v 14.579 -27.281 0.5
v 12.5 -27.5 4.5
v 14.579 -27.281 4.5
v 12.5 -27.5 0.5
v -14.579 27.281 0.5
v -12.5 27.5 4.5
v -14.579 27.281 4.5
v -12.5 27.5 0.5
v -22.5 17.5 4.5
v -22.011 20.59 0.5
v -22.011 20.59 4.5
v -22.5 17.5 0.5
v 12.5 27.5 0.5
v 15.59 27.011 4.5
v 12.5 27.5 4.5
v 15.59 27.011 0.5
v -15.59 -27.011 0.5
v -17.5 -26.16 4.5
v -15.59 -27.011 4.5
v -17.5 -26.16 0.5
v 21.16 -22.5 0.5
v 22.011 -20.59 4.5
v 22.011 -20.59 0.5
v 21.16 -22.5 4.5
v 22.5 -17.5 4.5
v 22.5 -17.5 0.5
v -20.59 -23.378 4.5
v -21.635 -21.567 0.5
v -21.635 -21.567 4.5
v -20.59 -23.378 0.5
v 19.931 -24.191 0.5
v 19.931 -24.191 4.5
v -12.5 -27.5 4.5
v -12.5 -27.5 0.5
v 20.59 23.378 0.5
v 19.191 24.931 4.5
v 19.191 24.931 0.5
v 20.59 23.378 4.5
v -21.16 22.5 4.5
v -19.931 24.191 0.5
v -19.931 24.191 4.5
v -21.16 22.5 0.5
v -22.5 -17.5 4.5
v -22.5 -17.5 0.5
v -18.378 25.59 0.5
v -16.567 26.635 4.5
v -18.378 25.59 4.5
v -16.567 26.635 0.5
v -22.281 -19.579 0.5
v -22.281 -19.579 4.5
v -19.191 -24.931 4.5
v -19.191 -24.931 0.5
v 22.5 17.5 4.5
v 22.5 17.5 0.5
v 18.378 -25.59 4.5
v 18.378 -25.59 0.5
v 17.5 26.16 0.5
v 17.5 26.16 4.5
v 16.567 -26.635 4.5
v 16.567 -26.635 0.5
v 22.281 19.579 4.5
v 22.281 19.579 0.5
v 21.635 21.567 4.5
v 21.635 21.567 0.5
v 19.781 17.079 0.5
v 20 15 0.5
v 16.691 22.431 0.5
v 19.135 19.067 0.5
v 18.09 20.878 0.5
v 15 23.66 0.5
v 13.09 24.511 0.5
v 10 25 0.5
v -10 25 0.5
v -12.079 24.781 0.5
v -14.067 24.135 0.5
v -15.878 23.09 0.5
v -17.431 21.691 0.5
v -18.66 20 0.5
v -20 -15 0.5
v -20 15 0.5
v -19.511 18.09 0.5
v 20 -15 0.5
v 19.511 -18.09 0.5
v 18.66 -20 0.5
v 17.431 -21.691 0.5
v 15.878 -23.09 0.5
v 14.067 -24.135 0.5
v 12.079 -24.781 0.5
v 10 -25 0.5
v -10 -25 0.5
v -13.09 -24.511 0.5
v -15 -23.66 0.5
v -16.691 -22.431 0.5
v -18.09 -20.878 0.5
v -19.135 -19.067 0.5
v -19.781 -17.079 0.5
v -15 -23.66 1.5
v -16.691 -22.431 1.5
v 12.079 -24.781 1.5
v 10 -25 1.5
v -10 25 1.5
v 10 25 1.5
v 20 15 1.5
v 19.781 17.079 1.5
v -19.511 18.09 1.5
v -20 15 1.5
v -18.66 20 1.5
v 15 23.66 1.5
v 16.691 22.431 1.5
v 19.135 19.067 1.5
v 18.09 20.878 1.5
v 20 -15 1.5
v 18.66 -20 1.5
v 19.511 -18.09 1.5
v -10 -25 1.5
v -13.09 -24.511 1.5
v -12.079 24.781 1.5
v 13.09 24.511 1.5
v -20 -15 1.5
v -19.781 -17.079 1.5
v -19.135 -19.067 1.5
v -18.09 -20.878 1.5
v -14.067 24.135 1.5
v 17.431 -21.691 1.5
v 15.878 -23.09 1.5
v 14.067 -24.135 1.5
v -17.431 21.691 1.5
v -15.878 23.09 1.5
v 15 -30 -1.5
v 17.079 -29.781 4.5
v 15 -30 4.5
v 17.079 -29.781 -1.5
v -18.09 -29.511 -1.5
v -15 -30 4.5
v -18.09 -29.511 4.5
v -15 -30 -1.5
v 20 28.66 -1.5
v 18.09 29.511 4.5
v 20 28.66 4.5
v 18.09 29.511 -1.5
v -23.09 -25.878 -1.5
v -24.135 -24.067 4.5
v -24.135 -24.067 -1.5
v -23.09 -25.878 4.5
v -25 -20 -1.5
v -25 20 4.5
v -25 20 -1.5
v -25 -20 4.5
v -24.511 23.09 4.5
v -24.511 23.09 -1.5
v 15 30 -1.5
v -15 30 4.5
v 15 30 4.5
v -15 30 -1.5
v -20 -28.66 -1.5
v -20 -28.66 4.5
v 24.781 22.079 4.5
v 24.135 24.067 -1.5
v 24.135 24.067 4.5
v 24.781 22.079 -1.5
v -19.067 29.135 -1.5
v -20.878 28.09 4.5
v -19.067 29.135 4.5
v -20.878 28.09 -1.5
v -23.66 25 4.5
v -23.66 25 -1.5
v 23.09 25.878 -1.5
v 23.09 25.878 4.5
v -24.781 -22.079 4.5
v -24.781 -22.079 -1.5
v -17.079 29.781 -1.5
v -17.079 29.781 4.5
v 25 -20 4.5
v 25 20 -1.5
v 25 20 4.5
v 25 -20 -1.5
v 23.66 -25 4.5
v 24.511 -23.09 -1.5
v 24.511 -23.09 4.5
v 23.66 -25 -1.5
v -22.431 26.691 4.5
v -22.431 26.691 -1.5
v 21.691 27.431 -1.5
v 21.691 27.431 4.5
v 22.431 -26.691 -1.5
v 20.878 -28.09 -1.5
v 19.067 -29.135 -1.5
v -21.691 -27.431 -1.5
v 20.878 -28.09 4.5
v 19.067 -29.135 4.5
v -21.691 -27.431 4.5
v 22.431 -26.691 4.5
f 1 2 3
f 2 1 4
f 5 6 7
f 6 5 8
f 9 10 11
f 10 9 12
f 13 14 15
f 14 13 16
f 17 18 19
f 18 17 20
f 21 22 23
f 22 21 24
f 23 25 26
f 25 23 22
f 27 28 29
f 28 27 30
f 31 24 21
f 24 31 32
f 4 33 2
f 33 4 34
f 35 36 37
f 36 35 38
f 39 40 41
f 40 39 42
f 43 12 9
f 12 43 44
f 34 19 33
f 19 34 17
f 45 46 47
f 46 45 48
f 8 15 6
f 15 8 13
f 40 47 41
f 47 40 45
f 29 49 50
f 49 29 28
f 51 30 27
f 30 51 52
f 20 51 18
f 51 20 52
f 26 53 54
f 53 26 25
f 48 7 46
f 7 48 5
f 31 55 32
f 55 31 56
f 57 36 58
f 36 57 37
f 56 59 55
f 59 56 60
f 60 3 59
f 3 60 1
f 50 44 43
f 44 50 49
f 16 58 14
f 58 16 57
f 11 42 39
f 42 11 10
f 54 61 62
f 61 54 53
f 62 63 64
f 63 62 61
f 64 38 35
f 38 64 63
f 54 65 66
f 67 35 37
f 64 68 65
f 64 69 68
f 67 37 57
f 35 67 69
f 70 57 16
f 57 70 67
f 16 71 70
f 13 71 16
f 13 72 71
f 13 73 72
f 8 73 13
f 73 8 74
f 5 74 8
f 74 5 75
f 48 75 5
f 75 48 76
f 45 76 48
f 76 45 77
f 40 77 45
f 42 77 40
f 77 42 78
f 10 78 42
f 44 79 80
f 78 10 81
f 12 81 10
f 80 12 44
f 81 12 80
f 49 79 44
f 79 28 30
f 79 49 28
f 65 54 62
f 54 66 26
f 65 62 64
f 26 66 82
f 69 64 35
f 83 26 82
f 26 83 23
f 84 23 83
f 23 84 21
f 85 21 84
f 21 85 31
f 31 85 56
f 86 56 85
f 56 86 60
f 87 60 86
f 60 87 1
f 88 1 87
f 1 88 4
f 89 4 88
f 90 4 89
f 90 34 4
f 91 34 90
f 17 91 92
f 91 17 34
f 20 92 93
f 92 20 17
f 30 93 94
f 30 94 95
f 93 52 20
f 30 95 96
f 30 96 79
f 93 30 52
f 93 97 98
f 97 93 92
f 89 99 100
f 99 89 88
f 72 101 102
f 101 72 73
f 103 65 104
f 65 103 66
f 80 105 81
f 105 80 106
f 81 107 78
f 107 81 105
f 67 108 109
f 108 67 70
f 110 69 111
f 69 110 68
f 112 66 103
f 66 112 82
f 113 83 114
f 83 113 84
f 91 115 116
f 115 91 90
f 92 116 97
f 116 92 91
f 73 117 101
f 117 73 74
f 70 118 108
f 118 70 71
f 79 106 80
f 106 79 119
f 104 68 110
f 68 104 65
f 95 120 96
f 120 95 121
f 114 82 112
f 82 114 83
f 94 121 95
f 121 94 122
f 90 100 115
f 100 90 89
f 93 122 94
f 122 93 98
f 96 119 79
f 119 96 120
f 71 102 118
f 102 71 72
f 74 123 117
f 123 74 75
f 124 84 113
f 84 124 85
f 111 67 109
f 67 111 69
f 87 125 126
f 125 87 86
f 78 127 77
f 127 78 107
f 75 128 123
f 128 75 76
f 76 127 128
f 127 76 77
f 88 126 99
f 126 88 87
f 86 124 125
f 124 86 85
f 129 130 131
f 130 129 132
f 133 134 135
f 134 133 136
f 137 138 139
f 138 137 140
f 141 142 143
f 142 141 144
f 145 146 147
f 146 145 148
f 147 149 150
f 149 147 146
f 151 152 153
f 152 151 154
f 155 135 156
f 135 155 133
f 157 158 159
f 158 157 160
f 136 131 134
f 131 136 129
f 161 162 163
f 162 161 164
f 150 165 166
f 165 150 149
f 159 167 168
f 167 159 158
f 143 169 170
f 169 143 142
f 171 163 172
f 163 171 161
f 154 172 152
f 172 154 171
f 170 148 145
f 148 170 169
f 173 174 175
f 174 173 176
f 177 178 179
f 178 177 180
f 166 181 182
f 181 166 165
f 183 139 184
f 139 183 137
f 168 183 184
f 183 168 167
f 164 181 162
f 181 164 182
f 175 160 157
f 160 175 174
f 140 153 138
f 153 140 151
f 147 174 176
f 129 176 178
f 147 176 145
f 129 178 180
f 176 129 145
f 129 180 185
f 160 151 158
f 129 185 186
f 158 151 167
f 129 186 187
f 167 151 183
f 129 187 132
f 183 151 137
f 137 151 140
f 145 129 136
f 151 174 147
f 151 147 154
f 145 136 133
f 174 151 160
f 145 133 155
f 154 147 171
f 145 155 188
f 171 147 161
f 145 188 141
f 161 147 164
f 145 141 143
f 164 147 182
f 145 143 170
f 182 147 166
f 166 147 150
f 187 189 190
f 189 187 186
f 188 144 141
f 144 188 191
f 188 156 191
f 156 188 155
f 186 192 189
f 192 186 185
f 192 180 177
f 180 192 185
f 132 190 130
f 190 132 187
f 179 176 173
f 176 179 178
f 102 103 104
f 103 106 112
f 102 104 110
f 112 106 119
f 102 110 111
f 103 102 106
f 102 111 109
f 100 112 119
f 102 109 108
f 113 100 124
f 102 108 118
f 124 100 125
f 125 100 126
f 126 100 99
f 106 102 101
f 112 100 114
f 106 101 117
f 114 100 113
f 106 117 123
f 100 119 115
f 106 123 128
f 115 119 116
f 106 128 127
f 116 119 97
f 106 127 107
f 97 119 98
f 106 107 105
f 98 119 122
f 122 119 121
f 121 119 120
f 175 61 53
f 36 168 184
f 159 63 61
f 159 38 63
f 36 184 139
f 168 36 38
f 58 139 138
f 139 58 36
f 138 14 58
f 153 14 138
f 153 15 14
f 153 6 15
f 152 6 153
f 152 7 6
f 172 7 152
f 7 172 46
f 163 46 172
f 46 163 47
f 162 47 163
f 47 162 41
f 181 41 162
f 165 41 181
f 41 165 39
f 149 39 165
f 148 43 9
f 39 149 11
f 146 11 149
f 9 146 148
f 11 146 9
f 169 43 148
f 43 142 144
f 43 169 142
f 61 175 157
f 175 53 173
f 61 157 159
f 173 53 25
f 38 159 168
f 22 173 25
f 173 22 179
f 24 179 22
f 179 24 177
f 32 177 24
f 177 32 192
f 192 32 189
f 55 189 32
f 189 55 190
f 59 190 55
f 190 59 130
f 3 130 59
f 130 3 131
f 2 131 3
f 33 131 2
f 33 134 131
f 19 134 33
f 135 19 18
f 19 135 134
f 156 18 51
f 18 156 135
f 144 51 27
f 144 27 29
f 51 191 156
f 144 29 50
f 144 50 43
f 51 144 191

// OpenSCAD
/*
 * Test for a stamp mold
 */
echo(version=version());

logo = "./images/jared.png"; 
imgRatio = 1.5;
logox = 732 * imgRatio; 
logoy = 524 * imgRatio; 

module roundedRect(size, radius) {  
	linear_extrude(height=size.z, center=true) {
		offset(radius) offset(-radius) {
			square([size.x, size.y], center = true);
		}
	}
}

// Base plate
// ----------
plateWidth = 50;
plateLength = 60;
plateThickNess = 3;
cornerRadius = 10;

difference() {  
	union() {
		difference() {
			roundedRect([plateWidth, plateLength, plateThickNess], cornerRadius);
			translate([0, 0, 2]) {
				scale([.9 * plateWidth / logox, .9 * plateWidth / logoy, .02]) {
					color("white") {
						rotate([0, 0, -90]) {
							surface(file=logo, invert=true, center=true);
						}
					}
				}
        // the groove around the picture
        difference() {
          roundedRect([plateWidth -  5, plateLength -  5, plateThickNess], cornerRadius);
          roundedRect([plateWidth - 10, plateLength - 10, plateThickNess * 1.1], cornerRadius);
        }
			}
		}
		// The frame
		translate([0, 0, (plateThickNess / 1)]) {
			difference() {
				roundedRect([plateWidth, plateLength, plateThickNess], cornerRadius);
				roundedRect([plateWidth - 5, plateLength - 5, plateThickNess * 1.1], cornerRadius);
			}
		}
	}
}
